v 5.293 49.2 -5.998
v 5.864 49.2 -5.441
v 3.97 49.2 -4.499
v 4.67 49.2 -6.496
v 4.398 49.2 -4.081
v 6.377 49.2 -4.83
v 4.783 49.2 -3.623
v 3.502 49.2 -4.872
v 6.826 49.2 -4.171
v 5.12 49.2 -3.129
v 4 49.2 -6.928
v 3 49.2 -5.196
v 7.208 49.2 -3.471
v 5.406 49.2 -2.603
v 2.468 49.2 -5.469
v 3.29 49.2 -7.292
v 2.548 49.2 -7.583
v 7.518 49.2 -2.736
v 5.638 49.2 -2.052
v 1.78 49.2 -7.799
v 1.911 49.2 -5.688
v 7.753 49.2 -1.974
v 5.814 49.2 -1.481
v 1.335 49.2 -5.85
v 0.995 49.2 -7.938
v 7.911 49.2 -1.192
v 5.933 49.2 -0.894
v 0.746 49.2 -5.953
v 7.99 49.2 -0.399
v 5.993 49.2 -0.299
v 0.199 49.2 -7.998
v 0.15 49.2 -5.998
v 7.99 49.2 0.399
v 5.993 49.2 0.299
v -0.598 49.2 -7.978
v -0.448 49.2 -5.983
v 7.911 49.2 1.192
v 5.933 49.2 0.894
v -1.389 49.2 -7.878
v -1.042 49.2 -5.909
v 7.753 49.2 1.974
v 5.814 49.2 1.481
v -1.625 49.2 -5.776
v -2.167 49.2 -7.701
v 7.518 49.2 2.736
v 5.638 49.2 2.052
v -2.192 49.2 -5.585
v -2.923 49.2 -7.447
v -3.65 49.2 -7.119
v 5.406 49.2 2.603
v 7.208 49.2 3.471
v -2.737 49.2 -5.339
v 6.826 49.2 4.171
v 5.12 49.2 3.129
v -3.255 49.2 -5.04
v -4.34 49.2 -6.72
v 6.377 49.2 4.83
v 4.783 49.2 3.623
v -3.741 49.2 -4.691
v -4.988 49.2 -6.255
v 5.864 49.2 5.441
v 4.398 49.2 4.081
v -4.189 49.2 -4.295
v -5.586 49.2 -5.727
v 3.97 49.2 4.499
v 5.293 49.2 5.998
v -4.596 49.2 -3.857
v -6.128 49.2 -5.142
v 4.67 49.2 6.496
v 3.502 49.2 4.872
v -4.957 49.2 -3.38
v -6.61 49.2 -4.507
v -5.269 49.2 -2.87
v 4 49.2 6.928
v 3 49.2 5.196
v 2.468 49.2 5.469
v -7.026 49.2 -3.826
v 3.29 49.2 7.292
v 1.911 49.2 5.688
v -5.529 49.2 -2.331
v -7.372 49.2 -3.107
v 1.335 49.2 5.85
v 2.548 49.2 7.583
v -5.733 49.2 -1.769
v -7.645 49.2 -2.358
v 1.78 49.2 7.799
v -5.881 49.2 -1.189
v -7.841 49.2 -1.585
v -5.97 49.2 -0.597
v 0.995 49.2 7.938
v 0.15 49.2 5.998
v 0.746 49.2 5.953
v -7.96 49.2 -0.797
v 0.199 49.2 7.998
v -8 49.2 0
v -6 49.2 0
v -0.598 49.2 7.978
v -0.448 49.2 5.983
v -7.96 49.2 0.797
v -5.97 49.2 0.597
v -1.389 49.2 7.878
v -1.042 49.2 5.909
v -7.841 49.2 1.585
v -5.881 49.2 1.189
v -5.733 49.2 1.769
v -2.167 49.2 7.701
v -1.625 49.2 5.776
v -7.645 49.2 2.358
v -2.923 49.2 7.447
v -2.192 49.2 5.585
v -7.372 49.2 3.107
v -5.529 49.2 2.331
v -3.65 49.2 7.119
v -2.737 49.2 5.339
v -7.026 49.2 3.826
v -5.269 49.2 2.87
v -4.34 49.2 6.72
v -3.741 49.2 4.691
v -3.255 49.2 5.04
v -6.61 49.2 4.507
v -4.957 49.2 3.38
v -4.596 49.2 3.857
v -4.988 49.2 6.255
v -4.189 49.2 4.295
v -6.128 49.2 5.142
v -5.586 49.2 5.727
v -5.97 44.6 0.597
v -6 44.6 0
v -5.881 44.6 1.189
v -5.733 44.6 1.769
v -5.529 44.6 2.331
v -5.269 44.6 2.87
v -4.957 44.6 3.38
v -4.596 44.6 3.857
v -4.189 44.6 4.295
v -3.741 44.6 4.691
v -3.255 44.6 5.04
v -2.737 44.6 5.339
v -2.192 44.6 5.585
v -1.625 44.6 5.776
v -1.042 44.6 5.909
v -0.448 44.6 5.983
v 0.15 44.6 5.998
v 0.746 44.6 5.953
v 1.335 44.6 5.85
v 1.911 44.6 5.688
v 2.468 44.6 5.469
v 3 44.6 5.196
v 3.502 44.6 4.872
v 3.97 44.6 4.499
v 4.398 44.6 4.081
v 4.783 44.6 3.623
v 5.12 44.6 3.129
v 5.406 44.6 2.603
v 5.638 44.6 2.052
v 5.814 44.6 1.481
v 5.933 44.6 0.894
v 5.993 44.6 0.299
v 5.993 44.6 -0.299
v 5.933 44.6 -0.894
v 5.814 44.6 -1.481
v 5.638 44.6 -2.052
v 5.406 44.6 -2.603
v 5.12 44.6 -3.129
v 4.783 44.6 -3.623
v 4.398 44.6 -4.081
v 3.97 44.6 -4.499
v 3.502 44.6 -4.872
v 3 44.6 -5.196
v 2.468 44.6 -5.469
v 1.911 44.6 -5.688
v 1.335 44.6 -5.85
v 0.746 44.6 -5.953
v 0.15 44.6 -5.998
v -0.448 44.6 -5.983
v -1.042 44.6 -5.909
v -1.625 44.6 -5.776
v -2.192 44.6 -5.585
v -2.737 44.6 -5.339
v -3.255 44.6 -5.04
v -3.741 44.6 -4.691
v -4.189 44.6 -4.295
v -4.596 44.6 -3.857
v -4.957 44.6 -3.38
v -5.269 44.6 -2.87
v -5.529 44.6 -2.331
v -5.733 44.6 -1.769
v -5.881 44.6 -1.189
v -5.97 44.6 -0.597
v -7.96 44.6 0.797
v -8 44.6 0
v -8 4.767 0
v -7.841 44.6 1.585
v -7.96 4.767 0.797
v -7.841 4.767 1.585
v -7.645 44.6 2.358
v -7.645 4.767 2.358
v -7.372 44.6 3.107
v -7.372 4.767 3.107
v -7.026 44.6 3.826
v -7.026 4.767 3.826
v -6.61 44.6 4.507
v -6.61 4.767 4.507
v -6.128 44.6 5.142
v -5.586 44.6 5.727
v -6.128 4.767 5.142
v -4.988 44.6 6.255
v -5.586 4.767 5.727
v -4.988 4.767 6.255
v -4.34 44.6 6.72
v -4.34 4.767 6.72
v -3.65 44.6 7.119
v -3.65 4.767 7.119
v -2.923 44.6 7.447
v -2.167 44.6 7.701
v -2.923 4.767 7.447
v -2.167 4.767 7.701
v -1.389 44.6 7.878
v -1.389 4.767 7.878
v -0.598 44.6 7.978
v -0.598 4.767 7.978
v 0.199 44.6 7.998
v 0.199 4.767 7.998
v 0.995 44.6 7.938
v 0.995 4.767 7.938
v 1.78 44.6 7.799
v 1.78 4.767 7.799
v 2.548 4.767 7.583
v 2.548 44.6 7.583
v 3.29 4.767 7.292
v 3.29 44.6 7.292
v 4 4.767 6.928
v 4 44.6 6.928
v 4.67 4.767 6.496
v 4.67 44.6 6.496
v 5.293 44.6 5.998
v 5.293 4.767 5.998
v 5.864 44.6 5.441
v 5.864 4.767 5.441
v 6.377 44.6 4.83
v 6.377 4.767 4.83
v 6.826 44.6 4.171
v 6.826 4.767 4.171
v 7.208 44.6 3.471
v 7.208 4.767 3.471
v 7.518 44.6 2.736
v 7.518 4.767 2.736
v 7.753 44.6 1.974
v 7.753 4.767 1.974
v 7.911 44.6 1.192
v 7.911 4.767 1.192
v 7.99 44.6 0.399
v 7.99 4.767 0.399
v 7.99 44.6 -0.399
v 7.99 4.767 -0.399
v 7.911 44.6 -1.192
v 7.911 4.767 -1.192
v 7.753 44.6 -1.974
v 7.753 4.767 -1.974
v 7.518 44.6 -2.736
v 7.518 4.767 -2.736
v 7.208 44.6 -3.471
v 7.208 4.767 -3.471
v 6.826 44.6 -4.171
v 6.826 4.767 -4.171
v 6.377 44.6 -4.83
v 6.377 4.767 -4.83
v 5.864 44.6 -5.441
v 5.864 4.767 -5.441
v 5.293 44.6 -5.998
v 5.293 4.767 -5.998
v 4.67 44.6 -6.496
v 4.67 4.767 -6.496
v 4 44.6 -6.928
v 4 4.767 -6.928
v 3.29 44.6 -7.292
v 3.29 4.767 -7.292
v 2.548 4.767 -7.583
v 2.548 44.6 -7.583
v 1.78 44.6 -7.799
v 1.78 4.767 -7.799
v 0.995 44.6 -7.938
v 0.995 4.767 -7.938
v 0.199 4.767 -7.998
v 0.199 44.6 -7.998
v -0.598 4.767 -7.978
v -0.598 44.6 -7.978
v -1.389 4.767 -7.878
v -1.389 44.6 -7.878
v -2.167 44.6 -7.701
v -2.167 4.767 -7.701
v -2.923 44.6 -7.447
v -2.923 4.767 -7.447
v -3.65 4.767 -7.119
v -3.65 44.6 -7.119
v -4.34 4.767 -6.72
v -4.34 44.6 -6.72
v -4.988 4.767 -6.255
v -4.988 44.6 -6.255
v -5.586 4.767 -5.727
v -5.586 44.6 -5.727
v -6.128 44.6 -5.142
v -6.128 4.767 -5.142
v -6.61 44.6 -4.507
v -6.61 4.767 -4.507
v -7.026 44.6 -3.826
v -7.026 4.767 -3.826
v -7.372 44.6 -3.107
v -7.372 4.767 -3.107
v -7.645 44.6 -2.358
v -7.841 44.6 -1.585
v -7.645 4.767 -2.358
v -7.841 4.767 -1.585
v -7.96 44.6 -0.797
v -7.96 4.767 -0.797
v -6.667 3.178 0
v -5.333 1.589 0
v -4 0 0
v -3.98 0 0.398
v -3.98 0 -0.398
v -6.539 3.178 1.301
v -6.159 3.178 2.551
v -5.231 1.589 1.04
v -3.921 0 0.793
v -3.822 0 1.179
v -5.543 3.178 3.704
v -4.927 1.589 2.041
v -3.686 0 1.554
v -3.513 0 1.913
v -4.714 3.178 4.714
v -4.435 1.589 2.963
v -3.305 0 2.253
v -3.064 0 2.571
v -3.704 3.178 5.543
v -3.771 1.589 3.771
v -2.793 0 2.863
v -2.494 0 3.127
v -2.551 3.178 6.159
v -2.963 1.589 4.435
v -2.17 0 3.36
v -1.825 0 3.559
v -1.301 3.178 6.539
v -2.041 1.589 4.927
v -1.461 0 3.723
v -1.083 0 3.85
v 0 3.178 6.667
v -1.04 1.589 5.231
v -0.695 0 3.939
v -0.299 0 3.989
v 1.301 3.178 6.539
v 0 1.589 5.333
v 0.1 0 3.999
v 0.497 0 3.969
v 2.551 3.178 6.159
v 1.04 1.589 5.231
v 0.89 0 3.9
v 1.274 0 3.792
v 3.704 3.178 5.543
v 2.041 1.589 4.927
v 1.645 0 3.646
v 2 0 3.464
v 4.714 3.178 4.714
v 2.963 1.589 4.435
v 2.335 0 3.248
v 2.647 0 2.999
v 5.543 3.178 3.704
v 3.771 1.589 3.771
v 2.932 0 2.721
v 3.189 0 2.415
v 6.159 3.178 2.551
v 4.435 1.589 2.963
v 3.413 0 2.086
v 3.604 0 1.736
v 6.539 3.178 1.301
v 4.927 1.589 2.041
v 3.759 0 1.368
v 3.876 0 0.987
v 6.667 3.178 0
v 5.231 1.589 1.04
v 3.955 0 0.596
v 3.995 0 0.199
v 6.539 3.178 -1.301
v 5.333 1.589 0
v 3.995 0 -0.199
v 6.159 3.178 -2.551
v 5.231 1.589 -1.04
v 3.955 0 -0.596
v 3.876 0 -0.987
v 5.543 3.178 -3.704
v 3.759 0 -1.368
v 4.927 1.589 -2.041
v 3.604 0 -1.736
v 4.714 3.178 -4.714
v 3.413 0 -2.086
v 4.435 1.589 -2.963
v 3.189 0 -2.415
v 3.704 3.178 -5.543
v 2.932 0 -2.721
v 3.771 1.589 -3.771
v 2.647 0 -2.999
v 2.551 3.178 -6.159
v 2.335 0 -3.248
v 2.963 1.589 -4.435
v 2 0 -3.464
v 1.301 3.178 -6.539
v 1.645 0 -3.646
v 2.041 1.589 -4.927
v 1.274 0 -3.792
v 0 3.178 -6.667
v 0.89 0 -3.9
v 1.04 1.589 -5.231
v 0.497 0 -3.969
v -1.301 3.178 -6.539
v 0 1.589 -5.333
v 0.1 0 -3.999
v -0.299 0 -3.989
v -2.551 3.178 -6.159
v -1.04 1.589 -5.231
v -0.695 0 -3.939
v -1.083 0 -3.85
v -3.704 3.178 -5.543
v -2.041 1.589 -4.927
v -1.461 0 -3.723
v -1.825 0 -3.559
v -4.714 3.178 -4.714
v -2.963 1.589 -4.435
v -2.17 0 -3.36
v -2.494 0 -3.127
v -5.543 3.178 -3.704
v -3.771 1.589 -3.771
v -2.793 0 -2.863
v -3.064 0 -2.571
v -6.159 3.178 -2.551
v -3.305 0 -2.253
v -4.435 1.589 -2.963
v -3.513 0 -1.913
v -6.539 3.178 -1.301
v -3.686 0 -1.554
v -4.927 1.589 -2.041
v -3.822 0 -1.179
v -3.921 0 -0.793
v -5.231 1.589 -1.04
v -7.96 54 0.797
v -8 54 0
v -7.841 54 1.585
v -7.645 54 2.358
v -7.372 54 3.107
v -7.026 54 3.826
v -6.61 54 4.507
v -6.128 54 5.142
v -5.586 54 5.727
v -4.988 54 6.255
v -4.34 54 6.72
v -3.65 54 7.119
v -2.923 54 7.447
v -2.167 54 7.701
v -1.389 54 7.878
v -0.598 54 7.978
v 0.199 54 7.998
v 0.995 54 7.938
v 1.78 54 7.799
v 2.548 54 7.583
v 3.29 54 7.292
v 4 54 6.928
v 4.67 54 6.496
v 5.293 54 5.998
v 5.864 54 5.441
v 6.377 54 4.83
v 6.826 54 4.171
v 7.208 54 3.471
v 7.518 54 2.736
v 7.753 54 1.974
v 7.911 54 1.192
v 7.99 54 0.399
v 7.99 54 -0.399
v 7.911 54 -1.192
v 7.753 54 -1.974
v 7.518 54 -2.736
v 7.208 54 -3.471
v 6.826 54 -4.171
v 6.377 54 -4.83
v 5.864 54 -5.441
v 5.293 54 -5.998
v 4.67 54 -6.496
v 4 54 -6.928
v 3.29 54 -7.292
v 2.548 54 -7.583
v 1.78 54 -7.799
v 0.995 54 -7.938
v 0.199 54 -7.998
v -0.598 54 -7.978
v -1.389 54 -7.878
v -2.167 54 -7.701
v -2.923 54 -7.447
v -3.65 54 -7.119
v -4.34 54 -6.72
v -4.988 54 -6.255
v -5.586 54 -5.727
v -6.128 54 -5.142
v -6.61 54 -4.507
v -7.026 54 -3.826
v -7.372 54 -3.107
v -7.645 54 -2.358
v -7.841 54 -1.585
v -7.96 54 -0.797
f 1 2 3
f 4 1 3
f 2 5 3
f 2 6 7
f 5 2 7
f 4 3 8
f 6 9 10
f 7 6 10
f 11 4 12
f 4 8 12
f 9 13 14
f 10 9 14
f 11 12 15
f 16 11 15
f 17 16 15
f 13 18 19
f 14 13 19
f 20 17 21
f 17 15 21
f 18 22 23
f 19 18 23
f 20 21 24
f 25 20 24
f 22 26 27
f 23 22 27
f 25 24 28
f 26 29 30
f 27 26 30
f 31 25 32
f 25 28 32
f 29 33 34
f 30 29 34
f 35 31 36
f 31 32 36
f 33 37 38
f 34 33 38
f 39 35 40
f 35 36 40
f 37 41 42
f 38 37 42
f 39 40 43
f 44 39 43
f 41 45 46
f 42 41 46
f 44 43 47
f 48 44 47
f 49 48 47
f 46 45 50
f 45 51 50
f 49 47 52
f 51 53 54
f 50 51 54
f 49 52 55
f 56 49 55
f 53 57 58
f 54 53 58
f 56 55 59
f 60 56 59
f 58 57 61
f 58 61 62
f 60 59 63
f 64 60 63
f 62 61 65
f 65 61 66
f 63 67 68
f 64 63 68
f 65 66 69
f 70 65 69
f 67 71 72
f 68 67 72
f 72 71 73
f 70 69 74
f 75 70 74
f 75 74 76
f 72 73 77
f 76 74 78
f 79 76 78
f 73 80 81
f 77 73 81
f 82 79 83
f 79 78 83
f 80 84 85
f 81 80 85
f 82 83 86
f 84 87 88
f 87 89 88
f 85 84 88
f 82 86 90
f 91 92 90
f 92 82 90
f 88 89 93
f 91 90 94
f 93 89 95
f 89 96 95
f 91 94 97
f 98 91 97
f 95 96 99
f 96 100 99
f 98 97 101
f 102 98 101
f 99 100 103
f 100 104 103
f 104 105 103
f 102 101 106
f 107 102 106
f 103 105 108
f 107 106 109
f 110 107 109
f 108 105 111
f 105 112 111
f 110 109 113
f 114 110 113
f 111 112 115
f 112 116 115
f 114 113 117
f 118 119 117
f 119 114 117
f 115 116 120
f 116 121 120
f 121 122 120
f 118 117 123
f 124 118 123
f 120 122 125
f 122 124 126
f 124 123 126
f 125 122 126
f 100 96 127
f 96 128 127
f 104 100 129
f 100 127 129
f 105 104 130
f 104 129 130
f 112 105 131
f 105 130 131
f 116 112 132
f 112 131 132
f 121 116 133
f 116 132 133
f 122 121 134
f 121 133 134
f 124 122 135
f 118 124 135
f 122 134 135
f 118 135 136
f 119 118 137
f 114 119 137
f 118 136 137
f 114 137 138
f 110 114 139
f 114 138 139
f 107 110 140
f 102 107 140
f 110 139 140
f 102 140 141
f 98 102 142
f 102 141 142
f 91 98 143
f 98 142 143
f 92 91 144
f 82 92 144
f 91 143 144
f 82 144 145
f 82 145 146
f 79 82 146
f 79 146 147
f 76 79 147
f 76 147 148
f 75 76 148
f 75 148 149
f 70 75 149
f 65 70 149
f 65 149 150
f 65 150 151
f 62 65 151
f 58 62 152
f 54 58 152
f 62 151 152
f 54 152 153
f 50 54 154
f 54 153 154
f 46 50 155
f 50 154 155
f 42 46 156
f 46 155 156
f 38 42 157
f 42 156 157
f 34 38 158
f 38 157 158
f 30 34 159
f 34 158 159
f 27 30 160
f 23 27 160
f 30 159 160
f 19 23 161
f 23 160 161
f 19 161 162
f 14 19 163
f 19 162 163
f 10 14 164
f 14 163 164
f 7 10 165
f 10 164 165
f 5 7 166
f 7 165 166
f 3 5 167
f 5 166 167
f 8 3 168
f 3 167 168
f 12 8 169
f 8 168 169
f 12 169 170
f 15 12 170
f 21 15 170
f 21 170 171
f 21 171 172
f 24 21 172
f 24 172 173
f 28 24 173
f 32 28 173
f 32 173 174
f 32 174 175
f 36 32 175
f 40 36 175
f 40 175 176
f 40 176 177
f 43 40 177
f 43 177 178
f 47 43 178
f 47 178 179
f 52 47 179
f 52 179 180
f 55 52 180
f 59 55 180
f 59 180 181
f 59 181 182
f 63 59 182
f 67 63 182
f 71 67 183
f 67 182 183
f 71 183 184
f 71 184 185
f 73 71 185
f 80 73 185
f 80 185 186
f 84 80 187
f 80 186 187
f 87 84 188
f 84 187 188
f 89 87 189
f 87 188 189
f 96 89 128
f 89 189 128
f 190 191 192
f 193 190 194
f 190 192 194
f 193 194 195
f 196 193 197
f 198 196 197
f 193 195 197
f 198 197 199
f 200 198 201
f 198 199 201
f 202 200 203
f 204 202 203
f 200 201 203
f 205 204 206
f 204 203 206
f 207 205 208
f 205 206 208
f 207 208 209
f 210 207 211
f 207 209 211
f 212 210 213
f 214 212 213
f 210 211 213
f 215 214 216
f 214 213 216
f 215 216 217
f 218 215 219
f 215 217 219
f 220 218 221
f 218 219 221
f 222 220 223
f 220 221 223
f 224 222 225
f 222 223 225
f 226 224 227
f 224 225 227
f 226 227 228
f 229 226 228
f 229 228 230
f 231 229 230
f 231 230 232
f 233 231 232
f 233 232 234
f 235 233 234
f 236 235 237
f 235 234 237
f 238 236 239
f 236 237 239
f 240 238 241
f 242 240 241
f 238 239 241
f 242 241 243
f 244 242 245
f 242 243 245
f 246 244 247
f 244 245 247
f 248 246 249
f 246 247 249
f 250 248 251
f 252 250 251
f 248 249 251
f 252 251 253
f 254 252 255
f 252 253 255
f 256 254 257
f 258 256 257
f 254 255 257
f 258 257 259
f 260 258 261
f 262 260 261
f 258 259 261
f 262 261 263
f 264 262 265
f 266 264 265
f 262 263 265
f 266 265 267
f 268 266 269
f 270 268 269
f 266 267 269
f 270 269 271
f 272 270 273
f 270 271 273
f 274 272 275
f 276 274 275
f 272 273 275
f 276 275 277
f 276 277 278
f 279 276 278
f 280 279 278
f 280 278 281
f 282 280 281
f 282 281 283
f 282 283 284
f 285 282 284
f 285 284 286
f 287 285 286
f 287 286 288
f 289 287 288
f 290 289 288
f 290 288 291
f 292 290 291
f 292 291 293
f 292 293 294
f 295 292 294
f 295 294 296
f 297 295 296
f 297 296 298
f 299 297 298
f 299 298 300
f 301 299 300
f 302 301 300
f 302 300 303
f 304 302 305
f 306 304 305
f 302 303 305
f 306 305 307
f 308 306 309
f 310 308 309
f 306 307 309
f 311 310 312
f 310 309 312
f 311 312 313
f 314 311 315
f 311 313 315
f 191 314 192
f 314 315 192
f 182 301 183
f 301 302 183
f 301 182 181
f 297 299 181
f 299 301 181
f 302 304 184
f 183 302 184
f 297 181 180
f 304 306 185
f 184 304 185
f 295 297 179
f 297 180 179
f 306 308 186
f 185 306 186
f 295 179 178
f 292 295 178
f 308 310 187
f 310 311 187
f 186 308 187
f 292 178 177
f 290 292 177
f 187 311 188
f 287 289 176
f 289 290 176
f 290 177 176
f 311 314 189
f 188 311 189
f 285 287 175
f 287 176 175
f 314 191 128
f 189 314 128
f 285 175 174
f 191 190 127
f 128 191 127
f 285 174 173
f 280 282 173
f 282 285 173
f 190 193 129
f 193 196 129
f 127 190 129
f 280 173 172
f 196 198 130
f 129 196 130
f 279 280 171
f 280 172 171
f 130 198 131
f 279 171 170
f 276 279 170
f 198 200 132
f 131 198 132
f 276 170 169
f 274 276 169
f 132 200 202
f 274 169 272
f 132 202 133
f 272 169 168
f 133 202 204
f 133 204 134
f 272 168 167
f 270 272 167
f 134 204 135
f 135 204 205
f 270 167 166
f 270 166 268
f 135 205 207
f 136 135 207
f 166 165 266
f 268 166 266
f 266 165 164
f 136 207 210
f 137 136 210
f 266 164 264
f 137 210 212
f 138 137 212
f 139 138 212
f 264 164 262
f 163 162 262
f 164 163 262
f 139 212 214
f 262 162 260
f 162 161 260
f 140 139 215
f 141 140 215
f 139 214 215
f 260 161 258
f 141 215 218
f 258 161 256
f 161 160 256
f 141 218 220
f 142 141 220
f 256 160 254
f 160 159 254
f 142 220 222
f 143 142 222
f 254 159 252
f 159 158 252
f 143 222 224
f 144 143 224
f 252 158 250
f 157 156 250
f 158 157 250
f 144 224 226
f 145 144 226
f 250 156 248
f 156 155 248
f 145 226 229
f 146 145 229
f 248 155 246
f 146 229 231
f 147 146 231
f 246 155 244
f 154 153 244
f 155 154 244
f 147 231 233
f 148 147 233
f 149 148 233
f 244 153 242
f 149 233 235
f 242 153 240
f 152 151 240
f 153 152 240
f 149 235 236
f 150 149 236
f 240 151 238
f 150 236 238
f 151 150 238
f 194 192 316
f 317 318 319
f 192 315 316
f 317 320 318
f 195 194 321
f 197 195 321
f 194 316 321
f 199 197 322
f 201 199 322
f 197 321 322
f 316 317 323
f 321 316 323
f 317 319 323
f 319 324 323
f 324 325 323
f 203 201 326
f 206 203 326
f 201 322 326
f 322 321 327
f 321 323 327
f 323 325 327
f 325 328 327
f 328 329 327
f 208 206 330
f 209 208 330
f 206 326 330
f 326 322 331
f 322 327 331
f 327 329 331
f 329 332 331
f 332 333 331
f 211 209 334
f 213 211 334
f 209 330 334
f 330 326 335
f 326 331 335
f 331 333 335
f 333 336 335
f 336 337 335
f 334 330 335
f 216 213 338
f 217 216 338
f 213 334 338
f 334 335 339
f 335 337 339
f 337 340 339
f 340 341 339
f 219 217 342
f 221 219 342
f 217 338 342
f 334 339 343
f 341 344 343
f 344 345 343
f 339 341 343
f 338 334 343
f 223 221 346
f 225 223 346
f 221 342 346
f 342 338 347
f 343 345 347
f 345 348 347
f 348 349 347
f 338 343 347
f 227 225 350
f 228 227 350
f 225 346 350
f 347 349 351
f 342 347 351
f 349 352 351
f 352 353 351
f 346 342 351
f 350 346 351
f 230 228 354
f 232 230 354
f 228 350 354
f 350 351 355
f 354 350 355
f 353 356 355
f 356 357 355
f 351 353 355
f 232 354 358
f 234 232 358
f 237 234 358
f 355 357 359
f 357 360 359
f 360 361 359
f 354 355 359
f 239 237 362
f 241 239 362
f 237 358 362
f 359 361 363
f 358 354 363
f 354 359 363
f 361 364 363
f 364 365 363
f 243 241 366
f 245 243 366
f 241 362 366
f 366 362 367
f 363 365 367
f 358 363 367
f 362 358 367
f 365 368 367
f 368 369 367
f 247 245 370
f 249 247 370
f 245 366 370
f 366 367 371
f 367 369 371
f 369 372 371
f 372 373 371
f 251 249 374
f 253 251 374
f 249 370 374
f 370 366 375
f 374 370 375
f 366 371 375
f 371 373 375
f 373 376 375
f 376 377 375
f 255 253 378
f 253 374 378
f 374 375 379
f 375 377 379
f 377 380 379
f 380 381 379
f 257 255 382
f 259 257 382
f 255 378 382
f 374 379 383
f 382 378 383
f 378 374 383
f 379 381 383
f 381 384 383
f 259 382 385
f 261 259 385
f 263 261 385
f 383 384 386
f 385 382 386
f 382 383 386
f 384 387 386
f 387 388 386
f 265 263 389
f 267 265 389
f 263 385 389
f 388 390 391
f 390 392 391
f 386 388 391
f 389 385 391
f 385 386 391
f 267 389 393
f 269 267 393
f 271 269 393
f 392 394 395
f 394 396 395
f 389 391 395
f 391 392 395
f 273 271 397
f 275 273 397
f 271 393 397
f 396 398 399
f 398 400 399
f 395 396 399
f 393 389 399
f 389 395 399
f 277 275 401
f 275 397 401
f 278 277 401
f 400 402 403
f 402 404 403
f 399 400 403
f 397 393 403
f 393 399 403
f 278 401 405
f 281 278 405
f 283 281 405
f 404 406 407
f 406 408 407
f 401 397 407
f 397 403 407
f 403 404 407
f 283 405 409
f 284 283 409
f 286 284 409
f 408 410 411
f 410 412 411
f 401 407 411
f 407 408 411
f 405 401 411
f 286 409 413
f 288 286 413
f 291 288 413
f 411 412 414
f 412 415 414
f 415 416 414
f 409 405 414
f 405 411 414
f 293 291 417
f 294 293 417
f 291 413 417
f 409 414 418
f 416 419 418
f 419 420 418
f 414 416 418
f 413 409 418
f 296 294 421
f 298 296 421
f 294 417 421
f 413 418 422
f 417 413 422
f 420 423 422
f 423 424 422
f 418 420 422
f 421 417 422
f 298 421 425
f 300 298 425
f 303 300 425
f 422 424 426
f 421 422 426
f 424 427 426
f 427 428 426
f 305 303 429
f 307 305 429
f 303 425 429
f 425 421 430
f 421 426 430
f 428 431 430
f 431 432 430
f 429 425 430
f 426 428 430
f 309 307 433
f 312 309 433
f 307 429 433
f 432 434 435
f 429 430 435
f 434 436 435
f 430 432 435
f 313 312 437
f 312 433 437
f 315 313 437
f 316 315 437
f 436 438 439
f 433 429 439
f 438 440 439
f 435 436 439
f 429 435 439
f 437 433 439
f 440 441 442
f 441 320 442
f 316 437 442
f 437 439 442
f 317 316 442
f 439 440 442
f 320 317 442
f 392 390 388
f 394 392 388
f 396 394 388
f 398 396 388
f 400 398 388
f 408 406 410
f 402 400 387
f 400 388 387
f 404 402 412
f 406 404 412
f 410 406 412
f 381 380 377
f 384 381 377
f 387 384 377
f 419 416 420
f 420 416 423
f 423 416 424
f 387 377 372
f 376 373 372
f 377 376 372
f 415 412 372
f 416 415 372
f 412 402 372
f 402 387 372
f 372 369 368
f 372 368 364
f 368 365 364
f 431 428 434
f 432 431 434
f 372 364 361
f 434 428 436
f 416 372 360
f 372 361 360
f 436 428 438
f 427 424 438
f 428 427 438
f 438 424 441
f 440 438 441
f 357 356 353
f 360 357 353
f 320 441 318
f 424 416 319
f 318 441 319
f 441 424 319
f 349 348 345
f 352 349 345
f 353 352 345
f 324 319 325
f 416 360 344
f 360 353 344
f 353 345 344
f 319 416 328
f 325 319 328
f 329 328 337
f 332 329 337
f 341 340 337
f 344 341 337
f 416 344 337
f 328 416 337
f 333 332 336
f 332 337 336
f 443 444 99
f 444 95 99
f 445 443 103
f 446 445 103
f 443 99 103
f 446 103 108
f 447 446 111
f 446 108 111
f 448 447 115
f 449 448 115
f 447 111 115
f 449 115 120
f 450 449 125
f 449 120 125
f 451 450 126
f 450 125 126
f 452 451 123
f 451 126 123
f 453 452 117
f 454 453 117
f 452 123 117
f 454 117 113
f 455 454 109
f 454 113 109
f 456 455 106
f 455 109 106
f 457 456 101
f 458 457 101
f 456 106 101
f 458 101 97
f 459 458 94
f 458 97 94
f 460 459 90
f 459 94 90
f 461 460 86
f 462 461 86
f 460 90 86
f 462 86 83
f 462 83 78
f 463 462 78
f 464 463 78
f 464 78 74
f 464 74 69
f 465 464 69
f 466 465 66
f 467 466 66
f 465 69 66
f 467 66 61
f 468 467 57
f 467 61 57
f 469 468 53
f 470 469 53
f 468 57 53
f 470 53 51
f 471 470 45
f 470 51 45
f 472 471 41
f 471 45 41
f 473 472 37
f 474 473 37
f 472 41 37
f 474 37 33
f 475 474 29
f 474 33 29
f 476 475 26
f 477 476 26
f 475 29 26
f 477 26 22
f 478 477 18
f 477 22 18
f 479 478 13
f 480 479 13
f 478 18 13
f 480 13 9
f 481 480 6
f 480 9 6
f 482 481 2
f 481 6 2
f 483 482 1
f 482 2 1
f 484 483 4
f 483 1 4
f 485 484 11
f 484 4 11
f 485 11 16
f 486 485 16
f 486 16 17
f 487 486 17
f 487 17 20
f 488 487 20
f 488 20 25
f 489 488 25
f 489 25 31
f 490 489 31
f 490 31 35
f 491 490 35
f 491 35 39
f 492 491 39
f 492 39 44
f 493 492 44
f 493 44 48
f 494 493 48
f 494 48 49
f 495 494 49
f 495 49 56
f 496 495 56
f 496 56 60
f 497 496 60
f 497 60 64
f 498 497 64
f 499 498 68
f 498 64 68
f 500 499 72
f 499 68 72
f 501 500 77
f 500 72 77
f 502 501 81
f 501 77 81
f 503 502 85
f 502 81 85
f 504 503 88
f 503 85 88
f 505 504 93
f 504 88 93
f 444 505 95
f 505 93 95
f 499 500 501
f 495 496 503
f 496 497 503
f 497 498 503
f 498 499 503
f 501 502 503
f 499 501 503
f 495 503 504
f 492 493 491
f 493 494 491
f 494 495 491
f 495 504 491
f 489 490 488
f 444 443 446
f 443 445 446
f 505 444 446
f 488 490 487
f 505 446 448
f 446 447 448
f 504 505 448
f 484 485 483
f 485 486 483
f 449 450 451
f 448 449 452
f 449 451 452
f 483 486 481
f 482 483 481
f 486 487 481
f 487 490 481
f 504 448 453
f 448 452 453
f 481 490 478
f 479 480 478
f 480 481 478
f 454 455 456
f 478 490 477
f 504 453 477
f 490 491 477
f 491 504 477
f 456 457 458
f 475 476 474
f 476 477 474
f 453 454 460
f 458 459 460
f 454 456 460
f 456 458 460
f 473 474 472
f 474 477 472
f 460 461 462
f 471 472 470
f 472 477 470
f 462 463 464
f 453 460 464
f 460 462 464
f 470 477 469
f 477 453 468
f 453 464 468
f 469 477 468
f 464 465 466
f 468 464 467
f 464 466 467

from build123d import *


with BuildPart() as f1:
    # F0 (on Top) → F1 (revolve)
    with BuildSketch(Plane.XY):
        Polygon((0, 0), (0, 54), (-8, 54), (-8, 49.2), (-6, 49.2), (-6, 44.6), (-8, 44.6), (-8, 4.767014), (-4, 0), align=None)
    revolve(axis=Axis((0, 27, 0), (0, 1, 0)))


solid = f1.part
